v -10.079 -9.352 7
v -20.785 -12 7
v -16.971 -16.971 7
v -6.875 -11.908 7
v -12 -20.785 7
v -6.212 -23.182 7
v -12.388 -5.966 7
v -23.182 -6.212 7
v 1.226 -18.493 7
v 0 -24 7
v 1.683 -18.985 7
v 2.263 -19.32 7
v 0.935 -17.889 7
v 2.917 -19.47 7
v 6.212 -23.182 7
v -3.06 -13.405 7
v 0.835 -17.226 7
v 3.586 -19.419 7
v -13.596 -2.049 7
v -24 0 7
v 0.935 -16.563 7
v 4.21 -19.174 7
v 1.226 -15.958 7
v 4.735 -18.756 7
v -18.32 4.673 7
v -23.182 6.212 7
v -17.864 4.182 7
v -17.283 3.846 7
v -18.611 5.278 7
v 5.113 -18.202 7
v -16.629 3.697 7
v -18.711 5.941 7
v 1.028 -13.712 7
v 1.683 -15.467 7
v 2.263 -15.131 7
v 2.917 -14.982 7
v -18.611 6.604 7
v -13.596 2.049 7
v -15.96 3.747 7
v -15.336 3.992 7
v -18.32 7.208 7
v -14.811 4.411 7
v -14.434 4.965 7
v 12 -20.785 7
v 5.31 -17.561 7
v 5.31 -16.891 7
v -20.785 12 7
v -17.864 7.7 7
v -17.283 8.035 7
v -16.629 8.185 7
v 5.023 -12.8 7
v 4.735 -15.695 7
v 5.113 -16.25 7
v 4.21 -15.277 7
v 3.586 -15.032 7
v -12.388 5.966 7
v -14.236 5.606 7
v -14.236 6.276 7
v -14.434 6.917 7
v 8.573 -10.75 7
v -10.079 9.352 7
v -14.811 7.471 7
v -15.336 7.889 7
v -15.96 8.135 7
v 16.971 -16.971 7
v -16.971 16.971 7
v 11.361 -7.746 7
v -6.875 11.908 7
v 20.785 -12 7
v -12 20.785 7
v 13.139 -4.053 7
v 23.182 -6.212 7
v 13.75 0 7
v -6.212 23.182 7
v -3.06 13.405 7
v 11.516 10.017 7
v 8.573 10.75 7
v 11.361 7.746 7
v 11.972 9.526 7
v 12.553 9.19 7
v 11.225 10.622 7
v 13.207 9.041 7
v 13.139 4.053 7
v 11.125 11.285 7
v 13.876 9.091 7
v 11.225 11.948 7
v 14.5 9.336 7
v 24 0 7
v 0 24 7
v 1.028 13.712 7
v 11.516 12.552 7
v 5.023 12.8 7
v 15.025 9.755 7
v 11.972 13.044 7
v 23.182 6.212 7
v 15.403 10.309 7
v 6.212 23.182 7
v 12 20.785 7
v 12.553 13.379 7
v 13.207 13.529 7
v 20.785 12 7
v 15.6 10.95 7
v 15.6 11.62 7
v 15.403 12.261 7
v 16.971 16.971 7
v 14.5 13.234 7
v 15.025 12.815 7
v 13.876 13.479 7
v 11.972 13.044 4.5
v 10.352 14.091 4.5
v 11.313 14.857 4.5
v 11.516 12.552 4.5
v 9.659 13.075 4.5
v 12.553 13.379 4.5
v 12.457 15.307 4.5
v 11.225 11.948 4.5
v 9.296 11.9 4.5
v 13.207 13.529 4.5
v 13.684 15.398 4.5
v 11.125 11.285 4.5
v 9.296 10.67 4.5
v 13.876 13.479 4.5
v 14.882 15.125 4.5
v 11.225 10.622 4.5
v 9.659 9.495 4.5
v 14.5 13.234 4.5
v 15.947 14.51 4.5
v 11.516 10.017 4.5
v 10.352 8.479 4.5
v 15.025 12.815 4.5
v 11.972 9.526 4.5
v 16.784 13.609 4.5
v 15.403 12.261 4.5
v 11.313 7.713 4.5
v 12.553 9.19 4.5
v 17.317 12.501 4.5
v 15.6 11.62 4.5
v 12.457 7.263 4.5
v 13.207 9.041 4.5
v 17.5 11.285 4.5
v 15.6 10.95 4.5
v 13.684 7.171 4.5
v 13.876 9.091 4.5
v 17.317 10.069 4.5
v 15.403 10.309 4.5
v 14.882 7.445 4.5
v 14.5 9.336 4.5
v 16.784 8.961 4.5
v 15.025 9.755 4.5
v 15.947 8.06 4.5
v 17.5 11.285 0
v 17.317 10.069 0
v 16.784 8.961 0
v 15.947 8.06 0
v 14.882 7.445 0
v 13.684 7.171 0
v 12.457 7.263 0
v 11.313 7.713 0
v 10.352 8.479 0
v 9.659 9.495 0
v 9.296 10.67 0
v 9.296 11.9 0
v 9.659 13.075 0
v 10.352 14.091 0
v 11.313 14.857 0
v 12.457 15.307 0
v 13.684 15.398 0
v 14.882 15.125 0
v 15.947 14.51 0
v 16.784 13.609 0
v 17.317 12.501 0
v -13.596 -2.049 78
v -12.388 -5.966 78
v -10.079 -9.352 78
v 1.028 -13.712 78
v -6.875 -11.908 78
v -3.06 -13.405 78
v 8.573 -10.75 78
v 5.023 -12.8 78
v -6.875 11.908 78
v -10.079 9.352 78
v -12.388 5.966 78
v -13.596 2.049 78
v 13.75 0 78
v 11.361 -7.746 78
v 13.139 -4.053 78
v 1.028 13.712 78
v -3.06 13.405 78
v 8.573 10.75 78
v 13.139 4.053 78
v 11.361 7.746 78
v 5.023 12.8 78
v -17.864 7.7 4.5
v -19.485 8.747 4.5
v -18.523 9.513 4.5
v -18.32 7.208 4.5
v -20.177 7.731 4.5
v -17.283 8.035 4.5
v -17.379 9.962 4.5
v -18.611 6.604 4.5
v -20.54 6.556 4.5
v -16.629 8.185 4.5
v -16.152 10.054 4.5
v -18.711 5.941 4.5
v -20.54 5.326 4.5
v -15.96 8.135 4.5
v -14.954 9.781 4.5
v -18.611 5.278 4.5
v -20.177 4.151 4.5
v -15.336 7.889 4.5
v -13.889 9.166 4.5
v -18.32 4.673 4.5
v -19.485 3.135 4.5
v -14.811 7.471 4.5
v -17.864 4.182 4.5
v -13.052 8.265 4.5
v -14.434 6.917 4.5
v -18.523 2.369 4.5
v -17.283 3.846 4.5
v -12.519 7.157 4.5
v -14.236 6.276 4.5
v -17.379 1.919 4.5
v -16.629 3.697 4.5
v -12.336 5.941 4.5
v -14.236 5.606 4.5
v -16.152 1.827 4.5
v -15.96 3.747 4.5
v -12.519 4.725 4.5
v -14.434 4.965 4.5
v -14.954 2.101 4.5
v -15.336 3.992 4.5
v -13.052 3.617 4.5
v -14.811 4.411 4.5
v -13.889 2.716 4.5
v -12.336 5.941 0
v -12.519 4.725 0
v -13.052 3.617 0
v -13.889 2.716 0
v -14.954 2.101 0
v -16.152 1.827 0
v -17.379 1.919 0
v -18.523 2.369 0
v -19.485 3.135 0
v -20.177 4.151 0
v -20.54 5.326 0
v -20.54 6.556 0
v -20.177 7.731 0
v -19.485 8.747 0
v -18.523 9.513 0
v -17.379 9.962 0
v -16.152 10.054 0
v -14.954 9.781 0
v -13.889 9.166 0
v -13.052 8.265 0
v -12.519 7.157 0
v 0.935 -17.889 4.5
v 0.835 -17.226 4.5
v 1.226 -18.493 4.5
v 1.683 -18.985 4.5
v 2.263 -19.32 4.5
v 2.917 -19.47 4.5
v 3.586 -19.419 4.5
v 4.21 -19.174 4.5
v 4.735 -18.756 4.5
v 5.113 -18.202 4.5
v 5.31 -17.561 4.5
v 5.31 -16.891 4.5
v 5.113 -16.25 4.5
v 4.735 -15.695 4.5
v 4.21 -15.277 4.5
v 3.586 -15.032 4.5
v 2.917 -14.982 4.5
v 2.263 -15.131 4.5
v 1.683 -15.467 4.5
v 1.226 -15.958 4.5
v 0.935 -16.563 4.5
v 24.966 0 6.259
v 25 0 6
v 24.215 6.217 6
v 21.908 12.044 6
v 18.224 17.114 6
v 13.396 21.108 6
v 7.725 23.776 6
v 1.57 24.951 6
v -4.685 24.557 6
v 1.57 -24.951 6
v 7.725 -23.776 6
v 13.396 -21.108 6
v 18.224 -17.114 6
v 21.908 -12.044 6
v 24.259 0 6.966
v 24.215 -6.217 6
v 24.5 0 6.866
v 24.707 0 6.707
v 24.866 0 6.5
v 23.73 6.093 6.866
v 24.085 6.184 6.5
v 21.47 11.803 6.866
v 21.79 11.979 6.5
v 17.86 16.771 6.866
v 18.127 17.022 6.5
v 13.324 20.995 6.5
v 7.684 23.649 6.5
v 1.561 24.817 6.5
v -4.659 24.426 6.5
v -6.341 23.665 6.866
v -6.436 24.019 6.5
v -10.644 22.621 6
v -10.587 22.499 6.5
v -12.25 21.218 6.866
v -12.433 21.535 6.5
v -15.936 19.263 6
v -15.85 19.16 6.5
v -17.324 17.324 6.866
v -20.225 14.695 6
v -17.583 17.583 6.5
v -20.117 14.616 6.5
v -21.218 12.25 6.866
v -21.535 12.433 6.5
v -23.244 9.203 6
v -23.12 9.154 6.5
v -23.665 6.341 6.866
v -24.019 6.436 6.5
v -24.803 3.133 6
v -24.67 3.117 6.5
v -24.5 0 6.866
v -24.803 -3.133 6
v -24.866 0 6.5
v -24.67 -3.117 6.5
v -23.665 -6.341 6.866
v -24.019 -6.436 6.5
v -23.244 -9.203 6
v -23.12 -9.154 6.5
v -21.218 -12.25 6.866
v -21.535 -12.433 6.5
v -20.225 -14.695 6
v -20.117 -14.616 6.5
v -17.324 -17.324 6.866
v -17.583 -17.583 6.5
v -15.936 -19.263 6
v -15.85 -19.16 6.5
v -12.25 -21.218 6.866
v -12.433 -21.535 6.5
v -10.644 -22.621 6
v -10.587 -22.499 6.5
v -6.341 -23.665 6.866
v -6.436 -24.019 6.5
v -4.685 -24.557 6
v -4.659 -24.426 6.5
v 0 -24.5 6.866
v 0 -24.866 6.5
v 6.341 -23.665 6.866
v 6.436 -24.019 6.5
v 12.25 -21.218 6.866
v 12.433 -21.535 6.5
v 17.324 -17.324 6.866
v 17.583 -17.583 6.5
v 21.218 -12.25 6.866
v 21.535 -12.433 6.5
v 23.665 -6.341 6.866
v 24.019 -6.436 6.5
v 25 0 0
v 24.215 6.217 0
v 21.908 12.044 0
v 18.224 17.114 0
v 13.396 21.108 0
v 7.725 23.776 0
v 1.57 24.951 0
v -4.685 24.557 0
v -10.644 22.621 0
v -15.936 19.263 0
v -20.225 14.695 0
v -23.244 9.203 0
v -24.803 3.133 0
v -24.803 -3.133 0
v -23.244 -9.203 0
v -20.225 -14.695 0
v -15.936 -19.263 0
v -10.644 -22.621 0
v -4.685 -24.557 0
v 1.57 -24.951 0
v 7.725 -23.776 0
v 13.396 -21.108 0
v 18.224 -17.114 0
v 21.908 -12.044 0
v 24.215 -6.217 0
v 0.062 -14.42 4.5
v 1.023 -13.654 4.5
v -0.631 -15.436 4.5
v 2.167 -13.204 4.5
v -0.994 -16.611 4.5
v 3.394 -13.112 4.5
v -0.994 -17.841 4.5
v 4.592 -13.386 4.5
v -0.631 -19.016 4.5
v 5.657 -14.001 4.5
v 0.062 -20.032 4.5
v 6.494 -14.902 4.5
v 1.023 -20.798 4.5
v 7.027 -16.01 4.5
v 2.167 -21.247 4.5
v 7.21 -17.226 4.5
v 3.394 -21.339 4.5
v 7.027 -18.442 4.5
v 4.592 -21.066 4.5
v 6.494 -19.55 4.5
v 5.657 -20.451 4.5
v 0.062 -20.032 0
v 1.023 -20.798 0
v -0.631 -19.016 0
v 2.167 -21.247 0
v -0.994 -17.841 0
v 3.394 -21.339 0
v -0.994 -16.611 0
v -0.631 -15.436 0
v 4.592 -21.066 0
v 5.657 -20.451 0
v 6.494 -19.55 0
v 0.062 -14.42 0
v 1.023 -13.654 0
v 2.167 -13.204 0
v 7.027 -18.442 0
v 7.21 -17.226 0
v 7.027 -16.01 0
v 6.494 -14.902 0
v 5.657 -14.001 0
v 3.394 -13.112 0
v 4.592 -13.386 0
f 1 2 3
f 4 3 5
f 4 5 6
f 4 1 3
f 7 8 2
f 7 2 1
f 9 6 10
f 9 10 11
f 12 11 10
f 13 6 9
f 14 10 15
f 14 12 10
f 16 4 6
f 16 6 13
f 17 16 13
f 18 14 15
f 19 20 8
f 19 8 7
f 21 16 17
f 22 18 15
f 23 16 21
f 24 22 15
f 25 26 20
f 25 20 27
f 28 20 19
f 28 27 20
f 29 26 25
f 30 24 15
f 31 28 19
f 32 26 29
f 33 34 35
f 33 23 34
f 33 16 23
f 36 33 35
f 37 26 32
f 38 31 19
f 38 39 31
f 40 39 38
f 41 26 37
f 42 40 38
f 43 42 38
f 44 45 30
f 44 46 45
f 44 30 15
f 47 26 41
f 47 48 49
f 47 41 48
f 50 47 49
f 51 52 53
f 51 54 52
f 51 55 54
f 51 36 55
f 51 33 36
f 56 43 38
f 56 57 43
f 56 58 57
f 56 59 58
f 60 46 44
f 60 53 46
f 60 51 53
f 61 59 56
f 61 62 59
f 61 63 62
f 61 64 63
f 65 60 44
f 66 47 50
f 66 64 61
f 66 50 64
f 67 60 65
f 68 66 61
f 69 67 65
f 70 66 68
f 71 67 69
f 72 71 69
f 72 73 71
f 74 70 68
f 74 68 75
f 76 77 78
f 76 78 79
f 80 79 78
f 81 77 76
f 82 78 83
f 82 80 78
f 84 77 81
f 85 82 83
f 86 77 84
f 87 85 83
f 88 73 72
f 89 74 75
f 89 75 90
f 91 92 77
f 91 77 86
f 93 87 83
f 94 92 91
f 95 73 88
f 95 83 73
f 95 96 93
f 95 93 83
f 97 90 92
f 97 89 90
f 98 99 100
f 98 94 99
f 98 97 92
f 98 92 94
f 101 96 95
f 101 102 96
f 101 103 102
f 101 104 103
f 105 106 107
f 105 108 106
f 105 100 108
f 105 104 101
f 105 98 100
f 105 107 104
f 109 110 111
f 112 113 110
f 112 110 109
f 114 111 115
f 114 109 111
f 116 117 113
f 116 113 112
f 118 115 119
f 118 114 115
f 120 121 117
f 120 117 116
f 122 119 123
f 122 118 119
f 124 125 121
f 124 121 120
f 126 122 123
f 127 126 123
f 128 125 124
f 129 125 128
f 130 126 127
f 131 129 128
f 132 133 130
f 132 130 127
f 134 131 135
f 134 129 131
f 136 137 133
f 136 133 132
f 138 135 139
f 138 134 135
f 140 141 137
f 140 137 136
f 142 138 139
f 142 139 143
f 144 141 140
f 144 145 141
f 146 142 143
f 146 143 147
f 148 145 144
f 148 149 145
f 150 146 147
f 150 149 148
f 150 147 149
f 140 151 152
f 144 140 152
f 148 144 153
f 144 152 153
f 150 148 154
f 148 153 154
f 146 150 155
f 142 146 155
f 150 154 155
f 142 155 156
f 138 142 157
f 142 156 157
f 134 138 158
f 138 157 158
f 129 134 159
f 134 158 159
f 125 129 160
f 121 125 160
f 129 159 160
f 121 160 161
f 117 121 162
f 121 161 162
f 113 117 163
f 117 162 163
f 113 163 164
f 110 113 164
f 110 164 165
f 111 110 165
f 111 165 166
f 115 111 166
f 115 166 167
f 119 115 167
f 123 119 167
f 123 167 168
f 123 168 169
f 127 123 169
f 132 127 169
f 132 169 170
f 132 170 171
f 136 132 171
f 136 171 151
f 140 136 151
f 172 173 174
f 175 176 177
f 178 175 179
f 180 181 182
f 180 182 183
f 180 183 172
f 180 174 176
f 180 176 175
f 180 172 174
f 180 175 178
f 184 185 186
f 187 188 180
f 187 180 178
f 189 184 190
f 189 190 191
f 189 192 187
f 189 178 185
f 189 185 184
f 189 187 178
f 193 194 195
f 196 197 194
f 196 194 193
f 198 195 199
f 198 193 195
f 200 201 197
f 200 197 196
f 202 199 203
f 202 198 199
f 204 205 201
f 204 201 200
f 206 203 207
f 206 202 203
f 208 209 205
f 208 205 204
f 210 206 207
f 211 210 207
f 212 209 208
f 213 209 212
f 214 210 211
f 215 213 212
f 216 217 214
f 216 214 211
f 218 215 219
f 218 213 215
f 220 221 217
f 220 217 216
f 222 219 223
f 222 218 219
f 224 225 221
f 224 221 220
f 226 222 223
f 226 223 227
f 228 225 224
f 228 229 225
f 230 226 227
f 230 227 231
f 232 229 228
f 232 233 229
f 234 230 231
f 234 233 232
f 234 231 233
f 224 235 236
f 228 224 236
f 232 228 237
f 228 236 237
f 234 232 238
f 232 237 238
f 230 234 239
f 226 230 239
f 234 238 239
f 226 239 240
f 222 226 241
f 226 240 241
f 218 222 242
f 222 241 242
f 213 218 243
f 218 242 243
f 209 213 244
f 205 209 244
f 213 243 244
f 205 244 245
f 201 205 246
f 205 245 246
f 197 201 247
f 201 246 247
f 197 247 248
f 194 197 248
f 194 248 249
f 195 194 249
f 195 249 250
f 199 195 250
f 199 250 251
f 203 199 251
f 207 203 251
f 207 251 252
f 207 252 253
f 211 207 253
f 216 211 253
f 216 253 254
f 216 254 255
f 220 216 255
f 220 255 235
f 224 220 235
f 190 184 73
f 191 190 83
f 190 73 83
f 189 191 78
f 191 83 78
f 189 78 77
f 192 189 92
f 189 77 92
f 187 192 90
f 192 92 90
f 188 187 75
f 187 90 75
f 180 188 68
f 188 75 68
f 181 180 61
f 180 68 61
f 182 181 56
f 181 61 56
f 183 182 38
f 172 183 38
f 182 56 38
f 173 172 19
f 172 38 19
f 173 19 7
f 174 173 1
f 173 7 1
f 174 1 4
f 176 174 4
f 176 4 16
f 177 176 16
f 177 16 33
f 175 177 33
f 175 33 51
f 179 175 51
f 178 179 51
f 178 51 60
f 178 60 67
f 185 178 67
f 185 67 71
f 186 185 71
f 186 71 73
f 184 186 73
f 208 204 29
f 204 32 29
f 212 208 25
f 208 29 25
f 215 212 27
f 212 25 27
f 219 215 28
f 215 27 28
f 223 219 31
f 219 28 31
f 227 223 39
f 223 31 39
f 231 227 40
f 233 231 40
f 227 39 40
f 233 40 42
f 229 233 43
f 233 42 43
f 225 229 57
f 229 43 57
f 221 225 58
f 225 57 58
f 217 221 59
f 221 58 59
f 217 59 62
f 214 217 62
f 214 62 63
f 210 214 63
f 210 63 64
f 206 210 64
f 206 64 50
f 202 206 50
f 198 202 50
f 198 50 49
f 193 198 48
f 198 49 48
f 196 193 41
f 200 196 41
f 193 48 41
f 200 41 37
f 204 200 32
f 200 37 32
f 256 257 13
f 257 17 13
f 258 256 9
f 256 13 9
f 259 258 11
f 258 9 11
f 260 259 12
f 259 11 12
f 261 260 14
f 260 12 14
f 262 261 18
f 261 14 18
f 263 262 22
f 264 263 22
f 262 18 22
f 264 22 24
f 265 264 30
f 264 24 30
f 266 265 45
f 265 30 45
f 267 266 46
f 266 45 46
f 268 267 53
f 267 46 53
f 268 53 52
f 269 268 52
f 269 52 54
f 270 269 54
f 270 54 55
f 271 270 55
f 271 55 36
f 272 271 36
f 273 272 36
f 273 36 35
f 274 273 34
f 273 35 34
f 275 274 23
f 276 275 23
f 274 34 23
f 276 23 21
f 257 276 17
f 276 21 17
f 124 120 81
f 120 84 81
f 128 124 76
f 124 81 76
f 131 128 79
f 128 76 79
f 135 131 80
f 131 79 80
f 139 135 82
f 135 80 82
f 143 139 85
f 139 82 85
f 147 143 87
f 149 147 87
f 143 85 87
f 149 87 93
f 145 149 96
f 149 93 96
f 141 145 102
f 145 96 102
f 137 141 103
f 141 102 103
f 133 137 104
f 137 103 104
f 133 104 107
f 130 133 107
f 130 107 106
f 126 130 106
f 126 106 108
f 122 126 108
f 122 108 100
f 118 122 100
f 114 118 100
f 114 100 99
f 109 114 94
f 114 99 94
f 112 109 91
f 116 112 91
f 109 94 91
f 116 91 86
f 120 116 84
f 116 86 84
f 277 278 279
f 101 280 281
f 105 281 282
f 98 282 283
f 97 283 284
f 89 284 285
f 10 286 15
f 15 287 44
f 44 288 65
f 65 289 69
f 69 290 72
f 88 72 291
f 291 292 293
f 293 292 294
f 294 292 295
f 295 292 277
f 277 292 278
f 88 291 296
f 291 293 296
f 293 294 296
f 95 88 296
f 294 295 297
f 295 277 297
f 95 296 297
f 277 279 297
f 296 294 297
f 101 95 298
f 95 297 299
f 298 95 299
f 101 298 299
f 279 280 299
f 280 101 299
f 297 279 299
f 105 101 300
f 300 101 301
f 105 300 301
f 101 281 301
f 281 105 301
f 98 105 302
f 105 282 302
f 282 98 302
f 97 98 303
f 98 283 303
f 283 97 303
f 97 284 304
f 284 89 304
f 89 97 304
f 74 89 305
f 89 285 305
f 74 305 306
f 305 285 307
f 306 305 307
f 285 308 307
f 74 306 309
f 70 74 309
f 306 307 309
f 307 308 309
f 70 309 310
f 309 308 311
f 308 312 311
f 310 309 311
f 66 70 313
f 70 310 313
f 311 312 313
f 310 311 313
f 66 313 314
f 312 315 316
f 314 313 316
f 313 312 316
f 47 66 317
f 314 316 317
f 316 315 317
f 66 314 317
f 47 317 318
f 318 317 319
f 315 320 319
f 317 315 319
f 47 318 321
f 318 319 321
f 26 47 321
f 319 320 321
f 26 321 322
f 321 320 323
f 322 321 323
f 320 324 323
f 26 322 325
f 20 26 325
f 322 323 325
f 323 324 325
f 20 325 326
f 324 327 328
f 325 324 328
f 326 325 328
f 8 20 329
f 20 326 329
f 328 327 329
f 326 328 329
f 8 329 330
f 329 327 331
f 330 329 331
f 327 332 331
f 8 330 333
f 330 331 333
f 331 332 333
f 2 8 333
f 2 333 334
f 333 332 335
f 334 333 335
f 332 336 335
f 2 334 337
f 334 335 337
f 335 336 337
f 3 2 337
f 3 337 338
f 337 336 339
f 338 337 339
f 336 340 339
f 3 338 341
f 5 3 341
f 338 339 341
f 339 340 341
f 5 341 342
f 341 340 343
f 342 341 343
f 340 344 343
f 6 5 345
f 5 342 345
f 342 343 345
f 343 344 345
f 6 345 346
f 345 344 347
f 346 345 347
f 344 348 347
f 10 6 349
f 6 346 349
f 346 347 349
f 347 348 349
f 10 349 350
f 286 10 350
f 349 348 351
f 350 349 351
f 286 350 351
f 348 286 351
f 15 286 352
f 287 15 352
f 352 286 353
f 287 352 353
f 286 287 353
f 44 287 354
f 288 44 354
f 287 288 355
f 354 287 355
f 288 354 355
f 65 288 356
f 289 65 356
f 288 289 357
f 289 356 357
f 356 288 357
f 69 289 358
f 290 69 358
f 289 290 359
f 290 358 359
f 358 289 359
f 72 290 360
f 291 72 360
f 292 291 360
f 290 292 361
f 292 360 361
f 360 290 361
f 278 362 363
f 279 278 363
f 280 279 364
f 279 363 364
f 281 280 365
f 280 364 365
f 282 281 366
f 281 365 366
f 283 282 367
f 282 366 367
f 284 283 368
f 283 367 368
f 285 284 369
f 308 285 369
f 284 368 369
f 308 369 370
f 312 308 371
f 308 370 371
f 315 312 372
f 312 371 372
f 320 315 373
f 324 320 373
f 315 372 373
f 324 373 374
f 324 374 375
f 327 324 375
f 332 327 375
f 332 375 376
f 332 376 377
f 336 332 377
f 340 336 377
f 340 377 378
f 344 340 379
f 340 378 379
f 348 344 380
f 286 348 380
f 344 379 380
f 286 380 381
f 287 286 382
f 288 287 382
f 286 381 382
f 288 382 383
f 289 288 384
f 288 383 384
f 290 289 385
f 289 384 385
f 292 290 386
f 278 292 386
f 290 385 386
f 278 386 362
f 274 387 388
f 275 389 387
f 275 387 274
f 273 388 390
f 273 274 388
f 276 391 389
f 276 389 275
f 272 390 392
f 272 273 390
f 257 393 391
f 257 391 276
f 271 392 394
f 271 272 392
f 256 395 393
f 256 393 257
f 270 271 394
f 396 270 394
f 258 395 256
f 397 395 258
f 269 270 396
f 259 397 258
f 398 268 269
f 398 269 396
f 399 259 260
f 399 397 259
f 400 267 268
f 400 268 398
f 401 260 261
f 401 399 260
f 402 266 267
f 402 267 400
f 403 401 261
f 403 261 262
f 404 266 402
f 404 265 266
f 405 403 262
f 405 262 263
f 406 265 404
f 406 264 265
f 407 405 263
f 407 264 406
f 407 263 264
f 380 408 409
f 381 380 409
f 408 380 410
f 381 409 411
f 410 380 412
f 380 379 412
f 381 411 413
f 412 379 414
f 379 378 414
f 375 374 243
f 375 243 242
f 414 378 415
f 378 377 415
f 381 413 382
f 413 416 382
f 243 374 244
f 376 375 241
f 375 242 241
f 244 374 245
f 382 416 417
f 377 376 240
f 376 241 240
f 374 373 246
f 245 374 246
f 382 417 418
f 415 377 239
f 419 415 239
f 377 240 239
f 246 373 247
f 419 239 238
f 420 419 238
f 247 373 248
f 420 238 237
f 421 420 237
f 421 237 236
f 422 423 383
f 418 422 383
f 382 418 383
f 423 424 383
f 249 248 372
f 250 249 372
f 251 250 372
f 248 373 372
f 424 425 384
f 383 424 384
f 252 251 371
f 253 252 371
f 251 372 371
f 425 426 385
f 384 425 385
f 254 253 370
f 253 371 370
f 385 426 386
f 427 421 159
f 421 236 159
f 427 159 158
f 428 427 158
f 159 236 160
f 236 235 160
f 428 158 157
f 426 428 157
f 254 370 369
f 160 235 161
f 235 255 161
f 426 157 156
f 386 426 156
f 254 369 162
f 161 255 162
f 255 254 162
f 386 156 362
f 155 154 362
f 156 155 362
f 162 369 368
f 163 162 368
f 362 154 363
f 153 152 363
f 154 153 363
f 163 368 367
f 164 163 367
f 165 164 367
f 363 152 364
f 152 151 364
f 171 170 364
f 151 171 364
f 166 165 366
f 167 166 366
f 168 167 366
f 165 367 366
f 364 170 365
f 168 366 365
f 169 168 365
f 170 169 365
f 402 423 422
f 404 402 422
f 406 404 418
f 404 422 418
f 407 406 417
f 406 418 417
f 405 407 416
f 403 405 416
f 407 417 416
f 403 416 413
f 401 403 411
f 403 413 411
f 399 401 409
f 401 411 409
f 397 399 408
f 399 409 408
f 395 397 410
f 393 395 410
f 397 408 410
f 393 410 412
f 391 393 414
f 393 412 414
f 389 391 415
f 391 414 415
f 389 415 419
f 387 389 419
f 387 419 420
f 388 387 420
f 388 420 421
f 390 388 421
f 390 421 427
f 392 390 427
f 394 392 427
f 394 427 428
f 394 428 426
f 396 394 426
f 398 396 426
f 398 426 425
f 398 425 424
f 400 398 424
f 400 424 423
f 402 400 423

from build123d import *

# Parameters (mm, degrees)
F0_R           = 25
F0_R_2         = 13.75
F1_DEPTH       = 7
F2_DEPTH       = 78
F3_D           = 4.5
F3_CBORE_D     = 8.25
F3_CBORE_DEPTH = 4.5
F4_R           = 1


with BuildPart() as f1:
    # F0 (on Top) → F1 (new body)
    with BuildSketch(Plane.XY):
        Circle(F0_R)
        Circle(F0_R_2, mode=Mode.SUBTRACT)
    extrude(amount=F1_DEPTH)

    # F0 (on Top) → F2 (join)
    with BuildSketch(Plane.XY):
        Circle(F0_R_2)
    extrude(amount=F2_DEPTH)

    # F3 (through all)
    with Locations(Plane(origin=(0, 0, 0), x_dir=(1, 0, 0), z_dir=(0, 0, -1))):
        with Locations((3.0853754045, 17.2258659757), (13.3753498349, -11.2849464684), (-16.4607252394, -5.9409195073)):
            CounterBoreHole(F3_D / 2, F3_CBORE_D / 2, F3_CBORE_DEPTH)

    # F4
    f4_edges = [f1.edges().sort_by_distance(p)[0] for p in [
        (-25, 0, 7),
    ]]
    fillet(f4_edges, radius=F4_R)


solid = f1.part
